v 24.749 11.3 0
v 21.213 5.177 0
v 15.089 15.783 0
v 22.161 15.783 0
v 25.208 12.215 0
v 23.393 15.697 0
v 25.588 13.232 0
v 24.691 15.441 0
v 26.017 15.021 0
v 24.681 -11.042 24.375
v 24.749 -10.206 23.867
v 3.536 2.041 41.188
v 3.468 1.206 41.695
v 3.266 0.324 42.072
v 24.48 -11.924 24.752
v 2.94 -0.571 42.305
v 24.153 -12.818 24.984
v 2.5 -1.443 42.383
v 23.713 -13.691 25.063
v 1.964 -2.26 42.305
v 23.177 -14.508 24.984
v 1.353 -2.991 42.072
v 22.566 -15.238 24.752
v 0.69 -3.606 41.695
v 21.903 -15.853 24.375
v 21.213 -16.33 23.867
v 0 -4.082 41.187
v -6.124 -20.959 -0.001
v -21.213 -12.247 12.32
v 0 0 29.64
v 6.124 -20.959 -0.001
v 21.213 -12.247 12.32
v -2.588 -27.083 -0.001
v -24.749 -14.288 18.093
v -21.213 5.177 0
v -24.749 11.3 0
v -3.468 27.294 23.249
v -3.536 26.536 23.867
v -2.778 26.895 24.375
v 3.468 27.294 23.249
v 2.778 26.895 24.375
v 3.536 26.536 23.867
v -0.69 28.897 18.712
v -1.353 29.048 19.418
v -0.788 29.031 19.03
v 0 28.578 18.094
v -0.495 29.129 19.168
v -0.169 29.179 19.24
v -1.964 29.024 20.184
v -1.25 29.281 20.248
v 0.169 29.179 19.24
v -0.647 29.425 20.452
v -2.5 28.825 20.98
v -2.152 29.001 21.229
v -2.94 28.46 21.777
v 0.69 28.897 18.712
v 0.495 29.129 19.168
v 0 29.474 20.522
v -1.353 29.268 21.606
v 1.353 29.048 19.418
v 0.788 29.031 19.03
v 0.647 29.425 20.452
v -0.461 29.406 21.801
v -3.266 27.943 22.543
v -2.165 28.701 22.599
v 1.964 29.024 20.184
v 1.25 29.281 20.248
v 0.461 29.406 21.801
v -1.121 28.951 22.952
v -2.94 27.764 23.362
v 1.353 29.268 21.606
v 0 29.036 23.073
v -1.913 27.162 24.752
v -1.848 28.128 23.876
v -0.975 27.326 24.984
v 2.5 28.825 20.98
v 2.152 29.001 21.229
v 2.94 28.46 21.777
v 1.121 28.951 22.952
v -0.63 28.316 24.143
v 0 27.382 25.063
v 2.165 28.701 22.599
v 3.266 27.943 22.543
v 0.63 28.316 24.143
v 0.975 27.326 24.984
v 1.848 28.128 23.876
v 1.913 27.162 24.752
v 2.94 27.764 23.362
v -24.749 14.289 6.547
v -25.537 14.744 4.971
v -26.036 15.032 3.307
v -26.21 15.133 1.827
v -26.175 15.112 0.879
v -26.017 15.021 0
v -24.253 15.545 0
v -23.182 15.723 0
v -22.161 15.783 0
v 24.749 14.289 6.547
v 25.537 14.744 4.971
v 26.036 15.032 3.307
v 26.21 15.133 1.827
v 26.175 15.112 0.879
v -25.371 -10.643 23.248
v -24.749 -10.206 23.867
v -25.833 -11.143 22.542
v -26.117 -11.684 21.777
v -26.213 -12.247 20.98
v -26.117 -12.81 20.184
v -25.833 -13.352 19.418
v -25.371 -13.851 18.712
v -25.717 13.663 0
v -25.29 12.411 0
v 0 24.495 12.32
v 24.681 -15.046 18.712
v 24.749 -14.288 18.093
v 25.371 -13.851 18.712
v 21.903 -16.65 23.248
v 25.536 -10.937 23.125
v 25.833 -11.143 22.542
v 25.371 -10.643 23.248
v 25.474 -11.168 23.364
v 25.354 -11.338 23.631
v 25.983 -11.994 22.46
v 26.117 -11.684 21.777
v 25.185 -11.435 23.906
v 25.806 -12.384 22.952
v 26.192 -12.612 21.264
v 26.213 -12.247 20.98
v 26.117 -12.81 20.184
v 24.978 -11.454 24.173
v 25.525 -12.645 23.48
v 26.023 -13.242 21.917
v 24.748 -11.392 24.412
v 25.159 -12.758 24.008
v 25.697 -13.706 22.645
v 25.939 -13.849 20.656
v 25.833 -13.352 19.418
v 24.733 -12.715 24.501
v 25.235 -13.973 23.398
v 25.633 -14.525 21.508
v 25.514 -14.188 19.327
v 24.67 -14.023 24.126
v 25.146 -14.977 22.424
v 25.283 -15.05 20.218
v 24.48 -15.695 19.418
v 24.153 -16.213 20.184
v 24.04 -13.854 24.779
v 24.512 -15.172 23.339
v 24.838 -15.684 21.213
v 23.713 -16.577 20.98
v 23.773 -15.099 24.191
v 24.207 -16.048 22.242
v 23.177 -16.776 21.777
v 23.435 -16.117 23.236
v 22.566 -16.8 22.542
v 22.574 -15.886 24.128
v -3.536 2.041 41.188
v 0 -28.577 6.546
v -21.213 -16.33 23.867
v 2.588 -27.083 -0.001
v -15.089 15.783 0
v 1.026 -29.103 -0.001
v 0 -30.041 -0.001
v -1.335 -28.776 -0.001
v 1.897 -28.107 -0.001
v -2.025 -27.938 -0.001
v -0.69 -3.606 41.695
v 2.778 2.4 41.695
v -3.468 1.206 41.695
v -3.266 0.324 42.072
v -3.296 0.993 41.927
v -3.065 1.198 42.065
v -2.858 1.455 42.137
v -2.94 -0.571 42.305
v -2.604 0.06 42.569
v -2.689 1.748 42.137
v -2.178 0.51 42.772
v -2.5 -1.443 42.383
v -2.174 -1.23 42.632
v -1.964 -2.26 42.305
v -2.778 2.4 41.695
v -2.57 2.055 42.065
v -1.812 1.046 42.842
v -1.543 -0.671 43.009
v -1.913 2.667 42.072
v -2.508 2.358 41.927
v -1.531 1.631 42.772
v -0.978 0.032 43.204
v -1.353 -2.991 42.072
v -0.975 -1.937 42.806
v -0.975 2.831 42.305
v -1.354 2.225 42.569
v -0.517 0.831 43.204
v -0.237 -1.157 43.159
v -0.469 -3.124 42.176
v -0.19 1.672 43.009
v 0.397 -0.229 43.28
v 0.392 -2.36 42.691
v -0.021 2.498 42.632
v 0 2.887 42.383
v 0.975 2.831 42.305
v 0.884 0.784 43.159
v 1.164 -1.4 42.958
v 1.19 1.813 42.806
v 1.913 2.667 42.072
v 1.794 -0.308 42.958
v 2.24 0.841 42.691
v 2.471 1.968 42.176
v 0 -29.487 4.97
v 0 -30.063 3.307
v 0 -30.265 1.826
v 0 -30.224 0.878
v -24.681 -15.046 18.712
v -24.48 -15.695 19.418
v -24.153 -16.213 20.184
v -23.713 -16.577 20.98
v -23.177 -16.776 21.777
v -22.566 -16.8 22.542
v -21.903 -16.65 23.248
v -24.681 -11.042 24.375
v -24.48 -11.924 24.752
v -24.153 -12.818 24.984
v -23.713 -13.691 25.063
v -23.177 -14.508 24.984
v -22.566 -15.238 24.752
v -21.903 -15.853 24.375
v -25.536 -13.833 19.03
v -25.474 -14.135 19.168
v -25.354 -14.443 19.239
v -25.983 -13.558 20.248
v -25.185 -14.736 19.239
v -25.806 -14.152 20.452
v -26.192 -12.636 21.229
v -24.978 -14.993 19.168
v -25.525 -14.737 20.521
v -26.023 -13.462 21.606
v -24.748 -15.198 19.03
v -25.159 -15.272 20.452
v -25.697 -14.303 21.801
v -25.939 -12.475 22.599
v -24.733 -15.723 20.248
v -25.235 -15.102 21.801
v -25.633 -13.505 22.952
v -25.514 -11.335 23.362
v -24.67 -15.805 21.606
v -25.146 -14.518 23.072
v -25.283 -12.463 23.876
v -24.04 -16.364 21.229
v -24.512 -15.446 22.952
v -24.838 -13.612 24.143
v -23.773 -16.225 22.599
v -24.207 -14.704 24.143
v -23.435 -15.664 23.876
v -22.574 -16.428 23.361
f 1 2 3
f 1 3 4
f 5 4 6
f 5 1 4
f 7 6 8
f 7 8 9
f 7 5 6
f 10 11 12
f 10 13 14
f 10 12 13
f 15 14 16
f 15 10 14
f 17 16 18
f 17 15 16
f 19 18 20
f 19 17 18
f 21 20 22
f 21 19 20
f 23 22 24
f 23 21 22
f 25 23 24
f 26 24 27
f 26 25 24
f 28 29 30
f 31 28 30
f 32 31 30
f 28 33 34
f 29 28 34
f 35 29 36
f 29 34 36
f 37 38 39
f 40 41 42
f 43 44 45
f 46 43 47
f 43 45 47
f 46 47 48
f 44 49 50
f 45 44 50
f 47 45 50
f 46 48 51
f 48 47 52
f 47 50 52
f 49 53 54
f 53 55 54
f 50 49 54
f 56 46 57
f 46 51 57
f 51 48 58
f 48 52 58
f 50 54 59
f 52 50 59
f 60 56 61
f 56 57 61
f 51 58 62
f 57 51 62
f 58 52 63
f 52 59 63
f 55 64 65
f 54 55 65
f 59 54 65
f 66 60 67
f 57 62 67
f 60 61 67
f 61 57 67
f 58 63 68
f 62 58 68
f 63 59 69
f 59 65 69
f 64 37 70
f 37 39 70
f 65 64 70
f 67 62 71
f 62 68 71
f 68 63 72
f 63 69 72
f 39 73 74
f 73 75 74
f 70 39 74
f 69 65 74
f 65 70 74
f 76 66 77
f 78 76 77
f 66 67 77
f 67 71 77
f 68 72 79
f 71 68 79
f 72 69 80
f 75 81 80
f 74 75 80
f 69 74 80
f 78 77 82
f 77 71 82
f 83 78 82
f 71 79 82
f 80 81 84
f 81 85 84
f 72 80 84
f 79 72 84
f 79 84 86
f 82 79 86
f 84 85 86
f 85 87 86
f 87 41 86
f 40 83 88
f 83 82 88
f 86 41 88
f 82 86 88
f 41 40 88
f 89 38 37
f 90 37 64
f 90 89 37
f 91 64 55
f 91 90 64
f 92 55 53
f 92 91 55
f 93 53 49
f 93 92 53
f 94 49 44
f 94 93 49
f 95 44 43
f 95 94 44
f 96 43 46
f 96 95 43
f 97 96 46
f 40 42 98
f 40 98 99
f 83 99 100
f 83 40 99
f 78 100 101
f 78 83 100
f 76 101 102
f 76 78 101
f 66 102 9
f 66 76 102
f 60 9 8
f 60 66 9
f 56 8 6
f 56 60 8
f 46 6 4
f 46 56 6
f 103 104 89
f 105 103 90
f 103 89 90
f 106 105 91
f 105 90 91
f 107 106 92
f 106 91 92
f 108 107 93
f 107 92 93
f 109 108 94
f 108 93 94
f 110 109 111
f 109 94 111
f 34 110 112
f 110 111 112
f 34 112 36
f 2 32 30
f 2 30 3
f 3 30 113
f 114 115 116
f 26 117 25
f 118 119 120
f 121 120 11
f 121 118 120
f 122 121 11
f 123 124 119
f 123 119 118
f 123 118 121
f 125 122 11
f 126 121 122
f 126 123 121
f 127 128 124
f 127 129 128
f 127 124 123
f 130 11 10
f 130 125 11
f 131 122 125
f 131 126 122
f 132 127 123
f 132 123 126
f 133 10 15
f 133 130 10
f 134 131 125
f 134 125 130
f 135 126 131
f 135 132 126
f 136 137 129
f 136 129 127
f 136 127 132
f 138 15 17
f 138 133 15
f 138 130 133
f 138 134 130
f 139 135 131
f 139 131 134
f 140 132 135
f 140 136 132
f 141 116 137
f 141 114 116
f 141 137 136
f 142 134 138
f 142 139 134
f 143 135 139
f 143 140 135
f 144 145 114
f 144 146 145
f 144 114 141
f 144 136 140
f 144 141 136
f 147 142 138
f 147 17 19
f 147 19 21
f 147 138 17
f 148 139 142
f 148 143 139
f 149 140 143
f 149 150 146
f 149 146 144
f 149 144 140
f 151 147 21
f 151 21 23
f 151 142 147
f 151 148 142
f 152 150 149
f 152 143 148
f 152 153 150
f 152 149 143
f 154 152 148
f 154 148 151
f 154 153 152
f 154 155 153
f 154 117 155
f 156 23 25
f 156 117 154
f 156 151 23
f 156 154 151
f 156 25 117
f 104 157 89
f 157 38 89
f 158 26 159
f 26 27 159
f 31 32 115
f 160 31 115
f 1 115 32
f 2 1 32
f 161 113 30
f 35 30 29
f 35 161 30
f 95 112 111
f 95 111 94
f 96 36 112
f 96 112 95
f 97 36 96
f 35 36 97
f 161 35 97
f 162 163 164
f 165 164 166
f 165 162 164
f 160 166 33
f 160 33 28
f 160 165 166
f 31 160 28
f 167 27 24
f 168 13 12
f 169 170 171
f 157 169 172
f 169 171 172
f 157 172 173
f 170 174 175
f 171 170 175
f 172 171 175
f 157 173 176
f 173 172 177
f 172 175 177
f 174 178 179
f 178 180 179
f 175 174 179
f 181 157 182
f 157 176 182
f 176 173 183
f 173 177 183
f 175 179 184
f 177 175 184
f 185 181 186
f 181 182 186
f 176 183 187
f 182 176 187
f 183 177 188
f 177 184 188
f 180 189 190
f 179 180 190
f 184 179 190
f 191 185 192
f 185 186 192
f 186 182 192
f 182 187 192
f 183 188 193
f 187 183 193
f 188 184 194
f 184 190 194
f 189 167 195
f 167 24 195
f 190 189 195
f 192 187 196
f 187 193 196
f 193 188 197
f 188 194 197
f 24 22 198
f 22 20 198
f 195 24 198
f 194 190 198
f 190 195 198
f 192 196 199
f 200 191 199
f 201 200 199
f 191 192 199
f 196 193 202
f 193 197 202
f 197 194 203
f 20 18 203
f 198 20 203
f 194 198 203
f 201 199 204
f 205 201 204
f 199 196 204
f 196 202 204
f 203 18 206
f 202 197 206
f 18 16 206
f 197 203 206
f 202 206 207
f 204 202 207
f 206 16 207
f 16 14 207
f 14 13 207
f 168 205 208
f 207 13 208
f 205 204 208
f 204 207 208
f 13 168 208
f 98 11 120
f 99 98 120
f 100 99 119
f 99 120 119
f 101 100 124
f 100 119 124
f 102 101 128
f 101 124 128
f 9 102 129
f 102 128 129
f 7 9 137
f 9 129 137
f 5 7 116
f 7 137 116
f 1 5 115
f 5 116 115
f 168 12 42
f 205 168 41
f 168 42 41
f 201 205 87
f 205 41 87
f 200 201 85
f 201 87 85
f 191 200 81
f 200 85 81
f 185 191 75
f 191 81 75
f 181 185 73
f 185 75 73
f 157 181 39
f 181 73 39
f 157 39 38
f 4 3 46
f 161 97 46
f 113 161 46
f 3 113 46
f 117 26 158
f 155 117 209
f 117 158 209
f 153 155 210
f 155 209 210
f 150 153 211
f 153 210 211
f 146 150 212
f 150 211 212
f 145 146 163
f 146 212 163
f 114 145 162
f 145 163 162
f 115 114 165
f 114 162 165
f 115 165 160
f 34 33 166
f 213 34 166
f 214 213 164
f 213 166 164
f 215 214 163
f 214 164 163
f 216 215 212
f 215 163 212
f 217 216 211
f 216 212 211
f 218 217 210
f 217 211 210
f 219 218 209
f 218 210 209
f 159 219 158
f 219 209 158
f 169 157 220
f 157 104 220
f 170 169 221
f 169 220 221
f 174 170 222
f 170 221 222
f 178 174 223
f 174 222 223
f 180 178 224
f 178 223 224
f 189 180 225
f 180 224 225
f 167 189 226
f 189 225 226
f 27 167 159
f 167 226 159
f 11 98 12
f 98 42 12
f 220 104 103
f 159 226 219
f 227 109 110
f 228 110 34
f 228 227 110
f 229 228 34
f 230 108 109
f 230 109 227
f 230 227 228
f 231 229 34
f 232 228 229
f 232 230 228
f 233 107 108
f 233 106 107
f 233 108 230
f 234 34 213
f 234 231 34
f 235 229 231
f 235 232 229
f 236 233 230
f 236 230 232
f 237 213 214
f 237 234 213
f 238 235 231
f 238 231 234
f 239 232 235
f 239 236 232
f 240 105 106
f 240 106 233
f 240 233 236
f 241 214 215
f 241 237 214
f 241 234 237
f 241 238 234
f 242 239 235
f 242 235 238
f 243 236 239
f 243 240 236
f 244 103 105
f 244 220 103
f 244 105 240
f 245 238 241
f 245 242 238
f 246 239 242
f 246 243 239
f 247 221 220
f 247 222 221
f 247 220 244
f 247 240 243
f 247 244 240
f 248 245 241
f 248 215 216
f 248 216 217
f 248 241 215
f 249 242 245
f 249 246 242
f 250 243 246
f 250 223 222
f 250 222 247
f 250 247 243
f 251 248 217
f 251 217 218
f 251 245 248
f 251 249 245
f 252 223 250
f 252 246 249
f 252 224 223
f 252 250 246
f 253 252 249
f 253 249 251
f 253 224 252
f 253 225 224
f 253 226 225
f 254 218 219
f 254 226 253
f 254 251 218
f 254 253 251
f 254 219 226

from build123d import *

# Parameters (mm, degrees)
F0_W      = 40
F0_H      = 40
F1_DEPTH  = 10
F3_DEPTH  = 30
F4_R      = 5
F6_R      = 32.5
F7_DEPTH  = 5
F9_ANGLE  = -225
F10_ANGLE = -35.264


with BuildPart() as f1:
    # F0 (on Top) → F1 (new body)
    with BuildSketch(Plane.XY):
        with Locations((20, 20)):
            Rectangle(F0_W, F0_H)
    extrude(amount=F1_DEPTH)

    # F2 (on face) → F3 (join)
    with BuildSketch(Plane.XY.offset(10)):
        Polygon((0, 40), (0, 0), (40, 0), (40, 10), (10, 10), (10, 40), align=None)
    extrude(amount=F3_DEPTH)

    # F4
    f4_edges = [f1.edges().sort_by_distance(p)[0] for p in [
        (20, 0, 40),
        (0, 20, 40),
        (0, 0, 20),
        (20, 0, 0),
        (0, 20, 0),
        (20, 40, 0),
        (40, 20, 0),
        (40, 0, 20),
        (0, 40, 20),
    ]]
    fillet(f4_edges, radius=F4_R)

    # F6 (on 3pt) → F7 (cut)
    with BuildSketch(Plane(origin=(30, 30, 30), x_dir=(-0.8164965809, 0.4082482905, 0.4082482905), z_dir=(0.5773502692, 0.5773502692, 0.5773502692))):
        Circle(F6_R)
    extrude(amount=-F7_DEPTH, mode=Mode.SUBTRACT)


with BuildPart() as f1_1:
    # F9: moved
    add(f1.part.rotate(Axis((0, 27.5, 0), (0, 1, 0)), F9_ANGLE))


with BuildPart() as f1_2:
    # F10: moved
    add(f1_1.part.rotate(Axis((27.5, 0, 0), (1, 0, 0)), F10_ANGLE))


with BuildPart() as f1_3:
    # F13: moved
    add(f1_2.part.moved(Location((0, 0, 46.961))))


solid = f1_3.part
